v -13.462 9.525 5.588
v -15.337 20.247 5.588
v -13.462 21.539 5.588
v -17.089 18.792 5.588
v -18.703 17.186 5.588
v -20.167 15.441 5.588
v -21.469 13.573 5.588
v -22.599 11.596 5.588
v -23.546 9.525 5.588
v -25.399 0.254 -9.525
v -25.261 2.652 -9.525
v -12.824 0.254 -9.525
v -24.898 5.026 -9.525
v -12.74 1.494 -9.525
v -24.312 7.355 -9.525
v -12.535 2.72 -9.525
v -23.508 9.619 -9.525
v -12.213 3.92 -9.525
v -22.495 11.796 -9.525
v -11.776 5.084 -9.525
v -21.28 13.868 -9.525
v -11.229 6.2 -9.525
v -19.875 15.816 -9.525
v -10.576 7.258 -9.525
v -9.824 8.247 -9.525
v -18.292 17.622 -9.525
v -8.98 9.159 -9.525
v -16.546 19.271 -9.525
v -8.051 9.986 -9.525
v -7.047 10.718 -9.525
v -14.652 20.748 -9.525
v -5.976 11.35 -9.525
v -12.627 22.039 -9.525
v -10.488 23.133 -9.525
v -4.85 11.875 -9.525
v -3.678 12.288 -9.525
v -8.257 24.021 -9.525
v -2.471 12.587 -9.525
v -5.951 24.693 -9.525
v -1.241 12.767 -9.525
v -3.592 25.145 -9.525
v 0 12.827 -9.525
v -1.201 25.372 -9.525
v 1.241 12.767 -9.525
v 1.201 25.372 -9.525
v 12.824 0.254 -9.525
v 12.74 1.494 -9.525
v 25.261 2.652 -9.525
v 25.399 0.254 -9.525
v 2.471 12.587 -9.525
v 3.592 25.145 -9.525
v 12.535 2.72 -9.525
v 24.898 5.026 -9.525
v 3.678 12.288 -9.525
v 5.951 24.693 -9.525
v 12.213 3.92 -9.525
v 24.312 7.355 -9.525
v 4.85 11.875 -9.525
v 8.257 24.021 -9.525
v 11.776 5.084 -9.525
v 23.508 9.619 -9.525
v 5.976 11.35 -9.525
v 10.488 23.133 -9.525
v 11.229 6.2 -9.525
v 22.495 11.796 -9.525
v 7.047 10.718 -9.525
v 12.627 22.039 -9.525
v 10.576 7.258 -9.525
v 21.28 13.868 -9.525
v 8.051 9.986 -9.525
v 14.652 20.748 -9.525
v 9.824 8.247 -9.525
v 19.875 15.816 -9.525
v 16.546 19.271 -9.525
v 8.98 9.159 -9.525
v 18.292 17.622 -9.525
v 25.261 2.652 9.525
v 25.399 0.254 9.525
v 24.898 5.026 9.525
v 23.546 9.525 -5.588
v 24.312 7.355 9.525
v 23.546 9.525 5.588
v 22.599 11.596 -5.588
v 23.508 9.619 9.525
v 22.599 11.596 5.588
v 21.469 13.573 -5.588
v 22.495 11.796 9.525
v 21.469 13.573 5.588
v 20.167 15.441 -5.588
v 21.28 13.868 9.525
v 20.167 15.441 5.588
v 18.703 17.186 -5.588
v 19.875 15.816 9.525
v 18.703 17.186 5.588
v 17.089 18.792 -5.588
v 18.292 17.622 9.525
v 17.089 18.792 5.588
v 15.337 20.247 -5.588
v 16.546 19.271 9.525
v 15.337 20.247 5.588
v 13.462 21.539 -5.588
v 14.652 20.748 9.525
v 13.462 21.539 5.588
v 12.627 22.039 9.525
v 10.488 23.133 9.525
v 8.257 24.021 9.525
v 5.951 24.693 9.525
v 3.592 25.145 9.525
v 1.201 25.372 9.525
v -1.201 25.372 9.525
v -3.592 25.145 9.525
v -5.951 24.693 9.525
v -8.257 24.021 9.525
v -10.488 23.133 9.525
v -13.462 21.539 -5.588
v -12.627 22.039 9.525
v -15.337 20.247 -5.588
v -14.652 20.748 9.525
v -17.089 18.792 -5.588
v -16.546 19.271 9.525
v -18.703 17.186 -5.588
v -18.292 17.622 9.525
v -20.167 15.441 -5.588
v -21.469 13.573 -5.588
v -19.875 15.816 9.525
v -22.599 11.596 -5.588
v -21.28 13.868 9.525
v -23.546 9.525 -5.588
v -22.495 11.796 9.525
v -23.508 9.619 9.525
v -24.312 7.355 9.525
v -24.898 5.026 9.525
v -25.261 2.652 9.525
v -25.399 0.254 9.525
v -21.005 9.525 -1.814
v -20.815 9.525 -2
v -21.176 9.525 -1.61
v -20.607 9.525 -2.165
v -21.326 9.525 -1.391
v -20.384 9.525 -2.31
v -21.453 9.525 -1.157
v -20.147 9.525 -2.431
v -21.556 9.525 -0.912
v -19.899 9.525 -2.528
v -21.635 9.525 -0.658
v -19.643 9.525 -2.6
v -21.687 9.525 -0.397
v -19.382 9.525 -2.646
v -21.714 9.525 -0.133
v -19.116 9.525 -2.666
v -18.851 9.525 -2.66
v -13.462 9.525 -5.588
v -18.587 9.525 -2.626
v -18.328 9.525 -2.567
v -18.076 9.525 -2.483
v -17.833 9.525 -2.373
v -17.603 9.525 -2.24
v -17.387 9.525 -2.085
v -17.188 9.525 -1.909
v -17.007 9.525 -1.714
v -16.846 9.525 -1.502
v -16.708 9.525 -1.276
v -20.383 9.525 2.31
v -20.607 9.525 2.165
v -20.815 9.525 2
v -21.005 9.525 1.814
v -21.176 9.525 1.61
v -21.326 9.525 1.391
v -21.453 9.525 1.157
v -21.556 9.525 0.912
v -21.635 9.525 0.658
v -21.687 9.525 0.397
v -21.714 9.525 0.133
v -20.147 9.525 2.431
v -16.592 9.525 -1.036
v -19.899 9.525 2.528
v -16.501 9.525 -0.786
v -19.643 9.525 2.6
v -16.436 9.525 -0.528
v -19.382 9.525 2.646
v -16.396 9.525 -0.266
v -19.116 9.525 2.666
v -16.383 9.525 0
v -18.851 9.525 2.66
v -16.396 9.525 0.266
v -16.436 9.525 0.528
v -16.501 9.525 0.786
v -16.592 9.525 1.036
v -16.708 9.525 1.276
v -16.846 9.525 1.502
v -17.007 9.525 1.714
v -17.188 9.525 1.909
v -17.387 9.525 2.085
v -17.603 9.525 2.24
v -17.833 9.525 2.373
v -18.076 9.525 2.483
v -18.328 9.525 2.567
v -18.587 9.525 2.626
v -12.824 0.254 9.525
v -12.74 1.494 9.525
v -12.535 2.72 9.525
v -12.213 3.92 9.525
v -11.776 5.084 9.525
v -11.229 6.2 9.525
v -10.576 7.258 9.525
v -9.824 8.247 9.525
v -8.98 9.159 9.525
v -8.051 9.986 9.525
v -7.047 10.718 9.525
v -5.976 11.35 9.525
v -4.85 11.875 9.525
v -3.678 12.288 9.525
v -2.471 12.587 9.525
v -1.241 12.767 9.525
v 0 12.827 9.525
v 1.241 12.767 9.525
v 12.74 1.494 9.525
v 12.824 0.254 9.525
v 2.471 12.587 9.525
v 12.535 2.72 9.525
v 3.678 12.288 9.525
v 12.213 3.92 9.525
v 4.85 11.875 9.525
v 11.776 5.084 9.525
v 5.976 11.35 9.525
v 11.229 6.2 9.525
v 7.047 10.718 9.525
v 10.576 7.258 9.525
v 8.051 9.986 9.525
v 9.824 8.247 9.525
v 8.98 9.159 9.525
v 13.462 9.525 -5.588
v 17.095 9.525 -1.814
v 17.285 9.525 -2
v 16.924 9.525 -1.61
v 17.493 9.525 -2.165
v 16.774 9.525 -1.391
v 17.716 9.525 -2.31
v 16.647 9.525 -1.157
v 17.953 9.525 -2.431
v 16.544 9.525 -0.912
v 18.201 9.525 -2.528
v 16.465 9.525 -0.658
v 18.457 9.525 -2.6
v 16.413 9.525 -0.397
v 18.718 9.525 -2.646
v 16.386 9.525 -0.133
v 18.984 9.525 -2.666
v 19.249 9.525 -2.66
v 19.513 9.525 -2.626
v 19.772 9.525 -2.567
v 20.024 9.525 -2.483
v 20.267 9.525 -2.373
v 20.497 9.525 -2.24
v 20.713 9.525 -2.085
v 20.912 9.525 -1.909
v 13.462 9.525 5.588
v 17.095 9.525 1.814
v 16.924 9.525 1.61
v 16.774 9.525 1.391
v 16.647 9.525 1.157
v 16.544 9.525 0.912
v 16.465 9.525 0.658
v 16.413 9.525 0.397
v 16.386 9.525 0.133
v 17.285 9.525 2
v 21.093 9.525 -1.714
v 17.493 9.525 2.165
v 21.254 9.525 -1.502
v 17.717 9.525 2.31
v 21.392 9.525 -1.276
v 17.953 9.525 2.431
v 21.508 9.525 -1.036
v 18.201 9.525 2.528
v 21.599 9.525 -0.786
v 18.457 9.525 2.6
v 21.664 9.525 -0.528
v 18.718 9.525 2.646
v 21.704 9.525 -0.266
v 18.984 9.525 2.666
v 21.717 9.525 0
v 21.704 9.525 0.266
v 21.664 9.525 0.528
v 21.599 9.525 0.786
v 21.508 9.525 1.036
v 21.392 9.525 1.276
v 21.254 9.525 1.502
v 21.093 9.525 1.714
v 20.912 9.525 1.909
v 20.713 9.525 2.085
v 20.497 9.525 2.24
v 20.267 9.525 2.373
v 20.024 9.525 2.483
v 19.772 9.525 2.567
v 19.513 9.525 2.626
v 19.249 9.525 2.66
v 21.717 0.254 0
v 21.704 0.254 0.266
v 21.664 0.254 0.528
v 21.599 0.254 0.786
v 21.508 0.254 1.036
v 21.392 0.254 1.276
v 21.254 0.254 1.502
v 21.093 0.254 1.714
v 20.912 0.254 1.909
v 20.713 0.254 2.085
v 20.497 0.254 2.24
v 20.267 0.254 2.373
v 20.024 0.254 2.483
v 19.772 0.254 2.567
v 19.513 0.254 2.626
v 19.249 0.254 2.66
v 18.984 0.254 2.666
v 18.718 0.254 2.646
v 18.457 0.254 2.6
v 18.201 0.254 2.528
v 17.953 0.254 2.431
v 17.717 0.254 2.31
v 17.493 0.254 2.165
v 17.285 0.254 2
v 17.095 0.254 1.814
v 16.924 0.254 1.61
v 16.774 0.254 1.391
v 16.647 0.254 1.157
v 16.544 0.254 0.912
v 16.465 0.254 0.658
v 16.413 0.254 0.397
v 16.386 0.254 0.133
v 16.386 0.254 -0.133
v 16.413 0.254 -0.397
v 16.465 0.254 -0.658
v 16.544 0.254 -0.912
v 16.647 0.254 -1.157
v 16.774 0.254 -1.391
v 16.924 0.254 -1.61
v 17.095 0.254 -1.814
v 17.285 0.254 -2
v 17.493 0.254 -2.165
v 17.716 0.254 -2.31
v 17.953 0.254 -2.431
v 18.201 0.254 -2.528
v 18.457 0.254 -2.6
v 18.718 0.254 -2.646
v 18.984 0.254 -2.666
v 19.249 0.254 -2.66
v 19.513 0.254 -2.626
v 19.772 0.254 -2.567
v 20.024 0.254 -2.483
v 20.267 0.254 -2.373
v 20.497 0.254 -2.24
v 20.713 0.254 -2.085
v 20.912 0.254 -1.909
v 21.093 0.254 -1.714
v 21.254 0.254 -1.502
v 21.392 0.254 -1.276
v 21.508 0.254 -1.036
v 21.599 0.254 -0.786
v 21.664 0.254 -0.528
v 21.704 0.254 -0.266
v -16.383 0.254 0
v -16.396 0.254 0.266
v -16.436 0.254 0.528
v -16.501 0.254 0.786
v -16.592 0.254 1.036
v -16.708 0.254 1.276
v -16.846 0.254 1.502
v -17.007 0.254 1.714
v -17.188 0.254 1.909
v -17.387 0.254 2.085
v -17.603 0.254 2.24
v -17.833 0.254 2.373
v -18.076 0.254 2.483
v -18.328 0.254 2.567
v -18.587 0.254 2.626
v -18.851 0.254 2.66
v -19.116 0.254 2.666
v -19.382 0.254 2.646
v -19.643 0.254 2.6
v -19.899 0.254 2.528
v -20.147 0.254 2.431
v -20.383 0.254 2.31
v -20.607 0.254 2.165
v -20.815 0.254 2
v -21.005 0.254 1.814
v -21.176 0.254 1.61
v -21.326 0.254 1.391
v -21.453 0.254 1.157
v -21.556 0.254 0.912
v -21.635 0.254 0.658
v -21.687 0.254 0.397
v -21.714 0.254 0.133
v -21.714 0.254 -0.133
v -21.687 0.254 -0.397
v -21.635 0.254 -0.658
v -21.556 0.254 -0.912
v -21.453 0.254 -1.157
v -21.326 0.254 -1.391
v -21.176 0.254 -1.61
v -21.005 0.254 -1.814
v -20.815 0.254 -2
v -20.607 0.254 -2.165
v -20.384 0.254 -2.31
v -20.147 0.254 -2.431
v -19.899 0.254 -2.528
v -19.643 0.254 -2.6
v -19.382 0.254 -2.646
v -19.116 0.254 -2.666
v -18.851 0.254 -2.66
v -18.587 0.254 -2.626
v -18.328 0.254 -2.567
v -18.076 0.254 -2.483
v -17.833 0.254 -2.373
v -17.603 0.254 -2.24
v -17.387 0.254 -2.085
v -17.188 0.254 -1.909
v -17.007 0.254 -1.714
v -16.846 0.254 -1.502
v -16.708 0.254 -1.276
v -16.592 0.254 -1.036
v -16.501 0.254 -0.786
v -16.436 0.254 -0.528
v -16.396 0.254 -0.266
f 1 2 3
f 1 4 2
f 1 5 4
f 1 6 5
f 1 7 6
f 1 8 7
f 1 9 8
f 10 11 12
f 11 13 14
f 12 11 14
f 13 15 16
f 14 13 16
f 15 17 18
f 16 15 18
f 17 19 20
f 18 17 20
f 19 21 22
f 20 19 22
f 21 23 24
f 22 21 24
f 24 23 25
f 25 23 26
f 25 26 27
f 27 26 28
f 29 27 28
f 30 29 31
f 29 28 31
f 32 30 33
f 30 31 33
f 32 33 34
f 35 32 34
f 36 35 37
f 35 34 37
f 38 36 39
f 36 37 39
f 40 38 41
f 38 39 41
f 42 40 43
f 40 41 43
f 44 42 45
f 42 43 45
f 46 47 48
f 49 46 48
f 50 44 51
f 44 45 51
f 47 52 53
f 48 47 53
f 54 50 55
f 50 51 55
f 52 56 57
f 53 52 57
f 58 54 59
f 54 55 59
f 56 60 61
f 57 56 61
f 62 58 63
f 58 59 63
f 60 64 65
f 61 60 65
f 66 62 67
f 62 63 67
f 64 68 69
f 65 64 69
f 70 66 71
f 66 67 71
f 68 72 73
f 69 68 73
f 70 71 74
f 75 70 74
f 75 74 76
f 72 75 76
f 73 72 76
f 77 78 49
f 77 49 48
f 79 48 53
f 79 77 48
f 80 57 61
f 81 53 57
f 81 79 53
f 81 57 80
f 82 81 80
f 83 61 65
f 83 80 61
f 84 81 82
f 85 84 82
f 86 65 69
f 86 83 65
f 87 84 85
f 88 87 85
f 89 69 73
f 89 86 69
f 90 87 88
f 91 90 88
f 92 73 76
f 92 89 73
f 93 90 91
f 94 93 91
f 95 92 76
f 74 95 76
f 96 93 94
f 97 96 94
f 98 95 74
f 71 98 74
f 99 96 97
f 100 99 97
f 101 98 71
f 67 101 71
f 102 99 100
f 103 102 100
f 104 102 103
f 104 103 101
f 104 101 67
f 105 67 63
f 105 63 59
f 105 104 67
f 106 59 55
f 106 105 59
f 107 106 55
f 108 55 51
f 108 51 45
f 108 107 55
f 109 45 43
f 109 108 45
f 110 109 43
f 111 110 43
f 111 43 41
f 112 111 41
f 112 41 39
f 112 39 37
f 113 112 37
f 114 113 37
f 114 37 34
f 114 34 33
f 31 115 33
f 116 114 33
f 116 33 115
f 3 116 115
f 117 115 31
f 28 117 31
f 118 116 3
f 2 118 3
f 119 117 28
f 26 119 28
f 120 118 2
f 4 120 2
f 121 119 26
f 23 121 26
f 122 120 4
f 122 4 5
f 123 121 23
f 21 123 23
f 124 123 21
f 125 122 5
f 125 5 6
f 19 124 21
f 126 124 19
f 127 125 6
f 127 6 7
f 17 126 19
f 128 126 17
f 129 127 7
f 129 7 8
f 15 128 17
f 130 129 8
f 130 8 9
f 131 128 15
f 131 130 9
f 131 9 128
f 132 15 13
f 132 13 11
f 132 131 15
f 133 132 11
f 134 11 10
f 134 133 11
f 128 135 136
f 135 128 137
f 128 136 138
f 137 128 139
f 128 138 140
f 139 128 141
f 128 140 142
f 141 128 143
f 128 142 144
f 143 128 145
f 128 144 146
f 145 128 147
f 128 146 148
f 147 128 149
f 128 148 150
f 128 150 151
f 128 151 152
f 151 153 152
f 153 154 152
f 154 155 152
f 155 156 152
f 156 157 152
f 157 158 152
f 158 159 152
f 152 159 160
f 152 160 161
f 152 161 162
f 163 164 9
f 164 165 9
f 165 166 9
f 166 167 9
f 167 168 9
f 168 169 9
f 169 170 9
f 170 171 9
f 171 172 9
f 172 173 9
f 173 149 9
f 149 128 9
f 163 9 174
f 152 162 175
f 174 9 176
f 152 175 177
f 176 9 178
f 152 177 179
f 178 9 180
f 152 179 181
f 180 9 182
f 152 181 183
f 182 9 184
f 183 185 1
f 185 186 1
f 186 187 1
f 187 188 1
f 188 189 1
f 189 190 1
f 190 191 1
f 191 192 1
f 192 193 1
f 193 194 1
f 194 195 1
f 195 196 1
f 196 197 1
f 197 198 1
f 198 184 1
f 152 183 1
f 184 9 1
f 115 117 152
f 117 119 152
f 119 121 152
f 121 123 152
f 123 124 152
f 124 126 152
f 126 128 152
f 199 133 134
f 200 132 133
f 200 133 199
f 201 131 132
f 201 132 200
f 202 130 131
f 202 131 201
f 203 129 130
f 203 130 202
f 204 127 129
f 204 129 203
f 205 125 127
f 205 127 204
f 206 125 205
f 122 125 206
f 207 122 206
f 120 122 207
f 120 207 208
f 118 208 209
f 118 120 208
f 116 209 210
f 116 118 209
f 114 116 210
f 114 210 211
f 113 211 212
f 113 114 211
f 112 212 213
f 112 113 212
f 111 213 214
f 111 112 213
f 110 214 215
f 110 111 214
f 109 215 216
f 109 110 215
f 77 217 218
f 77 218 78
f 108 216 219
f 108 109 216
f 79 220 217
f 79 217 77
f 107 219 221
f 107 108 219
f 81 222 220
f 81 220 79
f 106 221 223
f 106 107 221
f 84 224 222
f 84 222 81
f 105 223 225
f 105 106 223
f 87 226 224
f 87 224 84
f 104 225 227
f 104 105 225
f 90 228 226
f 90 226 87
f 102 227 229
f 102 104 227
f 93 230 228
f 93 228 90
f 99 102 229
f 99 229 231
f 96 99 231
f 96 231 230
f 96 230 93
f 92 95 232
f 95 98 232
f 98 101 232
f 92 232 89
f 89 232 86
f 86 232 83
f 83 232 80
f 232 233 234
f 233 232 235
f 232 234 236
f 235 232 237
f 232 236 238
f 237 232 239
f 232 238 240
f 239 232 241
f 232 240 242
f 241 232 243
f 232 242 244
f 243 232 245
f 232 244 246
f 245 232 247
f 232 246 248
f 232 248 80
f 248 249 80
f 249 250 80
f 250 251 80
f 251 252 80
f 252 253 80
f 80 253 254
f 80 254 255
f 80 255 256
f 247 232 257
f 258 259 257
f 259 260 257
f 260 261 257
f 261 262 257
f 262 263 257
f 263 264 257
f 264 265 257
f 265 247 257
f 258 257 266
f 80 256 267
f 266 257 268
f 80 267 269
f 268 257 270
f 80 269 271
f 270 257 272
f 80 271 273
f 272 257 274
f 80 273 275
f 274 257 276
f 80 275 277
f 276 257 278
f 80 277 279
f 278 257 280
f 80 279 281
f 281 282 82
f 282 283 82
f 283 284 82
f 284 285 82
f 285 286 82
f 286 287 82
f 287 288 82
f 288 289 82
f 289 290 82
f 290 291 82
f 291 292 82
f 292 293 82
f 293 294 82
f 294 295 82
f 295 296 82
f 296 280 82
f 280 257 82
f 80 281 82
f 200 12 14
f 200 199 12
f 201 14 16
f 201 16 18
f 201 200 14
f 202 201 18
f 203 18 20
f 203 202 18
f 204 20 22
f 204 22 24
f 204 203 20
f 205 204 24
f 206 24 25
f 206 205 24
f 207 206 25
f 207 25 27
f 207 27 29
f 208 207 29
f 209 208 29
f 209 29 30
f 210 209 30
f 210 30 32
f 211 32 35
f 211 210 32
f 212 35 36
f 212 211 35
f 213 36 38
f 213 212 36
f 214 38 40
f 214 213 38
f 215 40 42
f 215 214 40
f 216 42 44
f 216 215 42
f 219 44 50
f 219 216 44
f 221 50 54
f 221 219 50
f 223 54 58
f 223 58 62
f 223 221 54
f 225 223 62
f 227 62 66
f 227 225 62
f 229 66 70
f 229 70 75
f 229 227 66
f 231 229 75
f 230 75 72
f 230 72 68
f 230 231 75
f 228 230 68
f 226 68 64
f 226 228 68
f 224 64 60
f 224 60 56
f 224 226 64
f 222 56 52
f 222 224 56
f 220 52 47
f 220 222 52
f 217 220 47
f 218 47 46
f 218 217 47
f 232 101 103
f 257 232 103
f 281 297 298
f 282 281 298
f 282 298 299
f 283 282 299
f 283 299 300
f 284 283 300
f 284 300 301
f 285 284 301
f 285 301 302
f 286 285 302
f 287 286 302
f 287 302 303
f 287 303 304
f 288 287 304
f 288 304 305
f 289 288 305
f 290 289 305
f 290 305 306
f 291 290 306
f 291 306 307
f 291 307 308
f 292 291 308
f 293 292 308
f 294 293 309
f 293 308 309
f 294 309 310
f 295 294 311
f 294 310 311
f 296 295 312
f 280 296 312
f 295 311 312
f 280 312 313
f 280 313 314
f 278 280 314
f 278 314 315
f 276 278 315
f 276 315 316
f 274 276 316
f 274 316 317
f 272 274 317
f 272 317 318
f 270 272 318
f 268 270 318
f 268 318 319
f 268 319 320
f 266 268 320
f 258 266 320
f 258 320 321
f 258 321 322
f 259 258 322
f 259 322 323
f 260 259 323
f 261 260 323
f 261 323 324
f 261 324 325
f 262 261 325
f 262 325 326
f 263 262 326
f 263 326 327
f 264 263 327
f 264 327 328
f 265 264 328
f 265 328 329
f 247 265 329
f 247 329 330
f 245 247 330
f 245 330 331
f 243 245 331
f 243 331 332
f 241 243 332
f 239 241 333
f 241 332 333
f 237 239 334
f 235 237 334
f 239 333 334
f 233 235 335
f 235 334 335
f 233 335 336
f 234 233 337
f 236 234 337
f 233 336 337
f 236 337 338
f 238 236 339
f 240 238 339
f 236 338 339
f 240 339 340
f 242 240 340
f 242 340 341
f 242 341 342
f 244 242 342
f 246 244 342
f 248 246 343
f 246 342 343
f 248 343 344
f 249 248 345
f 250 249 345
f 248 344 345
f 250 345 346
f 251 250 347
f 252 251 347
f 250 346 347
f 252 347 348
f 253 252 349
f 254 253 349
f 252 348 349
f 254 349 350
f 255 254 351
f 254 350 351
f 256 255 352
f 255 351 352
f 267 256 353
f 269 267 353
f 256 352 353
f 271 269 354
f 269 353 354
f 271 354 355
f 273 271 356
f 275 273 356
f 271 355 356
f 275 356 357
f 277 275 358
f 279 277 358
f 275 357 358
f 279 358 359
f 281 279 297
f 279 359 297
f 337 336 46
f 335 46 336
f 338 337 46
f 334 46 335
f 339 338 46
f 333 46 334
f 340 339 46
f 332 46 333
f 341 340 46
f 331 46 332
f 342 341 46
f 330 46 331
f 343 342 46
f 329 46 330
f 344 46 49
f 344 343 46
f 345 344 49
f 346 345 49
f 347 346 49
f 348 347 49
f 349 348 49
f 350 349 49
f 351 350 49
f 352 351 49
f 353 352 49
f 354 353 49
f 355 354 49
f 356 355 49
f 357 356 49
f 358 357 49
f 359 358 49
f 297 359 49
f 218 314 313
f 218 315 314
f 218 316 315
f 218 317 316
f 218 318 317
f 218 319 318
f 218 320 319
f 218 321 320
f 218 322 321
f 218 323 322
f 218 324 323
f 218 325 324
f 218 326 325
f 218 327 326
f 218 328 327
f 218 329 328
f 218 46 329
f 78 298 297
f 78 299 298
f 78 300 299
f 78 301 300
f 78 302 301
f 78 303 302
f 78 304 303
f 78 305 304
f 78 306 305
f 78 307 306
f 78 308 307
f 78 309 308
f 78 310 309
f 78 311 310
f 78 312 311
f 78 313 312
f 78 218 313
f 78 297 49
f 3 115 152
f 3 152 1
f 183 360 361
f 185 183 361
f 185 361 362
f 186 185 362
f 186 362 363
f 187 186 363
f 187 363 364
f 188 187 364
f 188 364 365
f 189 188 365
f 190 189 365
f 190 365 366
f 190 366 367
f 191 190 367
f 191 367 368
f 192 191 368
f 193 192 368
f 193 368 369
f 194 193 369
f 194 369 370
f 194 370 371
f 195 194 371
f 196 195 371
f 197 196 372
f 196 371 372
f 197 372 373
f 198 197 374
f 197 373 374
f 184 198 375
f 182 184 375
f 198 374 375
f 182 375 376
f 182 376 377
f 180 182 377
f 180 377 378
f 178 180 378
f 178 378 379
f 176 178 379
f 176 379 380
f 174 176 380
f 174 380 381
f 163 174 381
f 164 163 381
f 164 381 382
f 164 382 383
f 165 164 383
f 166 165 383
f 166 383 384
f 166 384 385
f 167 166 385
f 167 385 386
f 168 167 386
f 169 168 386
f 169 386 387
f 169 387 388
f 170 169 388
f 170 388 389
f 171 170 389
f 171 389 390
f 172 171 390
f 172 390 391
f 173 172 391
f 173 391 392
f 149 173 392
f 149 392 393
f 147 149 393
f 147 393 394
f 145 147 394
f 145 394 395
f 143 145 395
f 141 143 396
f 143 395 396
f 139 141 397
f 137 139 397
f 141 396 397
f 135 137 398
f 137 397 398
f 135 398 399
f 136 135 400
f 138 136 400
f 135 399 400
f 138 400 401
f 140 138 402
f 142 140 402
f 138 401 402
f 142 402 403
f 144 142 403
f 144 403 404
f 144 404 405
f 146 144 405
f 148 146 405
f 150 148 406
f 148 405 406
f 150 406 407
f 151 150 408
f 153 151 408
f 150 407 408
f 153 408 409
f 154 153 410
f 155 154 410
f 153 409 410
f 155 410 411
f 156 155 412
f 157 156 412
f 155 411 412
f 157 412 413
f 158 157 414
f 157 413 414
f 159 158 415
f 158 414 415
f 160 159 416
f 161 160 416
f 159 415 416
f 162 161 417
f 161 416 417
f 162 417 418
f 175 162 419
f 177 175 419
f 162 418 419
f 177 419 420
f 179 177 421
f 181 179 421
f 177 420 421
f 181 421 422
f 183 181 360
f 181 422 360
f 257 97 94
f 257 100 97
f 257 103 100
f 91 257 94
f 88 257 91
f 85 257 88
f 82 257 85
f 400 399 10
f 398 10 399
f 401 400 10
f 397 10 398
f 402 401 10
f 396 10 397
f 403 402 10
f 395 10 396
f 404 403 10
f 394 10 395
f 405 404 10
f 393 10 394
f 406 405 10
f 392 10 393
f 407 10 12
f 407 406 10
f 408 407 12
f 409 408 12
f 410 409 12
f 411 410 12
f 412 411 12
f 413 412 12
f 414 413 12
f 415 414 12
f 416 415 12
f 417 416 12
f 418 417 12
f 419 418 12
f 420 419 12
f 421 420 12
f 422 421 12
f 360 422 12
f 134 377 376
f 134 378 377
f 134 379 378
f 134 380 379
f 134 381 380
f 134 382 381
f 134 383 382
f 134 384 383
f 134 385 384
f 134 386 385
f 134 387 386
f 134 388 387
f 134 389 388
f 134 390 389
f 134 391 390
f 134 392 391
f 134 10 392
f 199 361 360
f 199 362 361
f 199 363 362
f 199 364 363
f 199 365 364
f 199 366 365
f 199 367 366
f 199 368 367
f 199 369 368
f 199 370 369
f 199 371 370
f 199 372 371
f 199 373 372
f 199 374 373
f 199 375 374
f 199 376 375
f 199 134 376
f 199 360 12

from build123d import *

# Parameters (mm, degrees)
F1_DEPTH = 9.525
F2_R     = 2.667
F4_DEPTH = 25.401
F5_W     = 11.93673
F5_H     = 11.176
F6_DEPTH = 15.876


with BuildPart() as f1:
    # F0 (on Top) → F1 (new body, symmetric)
    with BuildSketch(Plane.XY):
        with BuildLine():
            ThreePointArc((-12.824485, 0.254), (0, 12.827), (12.824485, 0.254))
            Line((12.824485, 0.254), (25.39873, 0.254))
            ThreePointArc((25.39873, 0.254), (0, 25.4), (-25.39873, 0.254))
            Line((-25.39873, 0.254), (-12.824485, 0.254))
        make_face()
    extrude(amount=F1_DEPTH, both=True)

    # F2 (on Front) → F4 (cut, through all)
    with BuildSketch(Plane.XZ):
        with Locations((-19.05, 0)):
            Circle(F2_R)
        with Locations((19.05, 0)):
            Circle(F2_R)
    extrude(amount=-F4_DEPTH, mode=Mode.SUBTRACT)

    # F5 (on offset) → F6 (cut, through all)
    with BuildSketch(Plane.XZ.offset(-9.525)):
        with Locations((19.430365, 0)):
            Rectangle(F5_W, F5_H)
        with Locations((-19.430365, 0)):
            Rectangle(F5_W, F5_H)
    extrude(amount=-F6_DEPTH, mode=Mode.SUBTRACT)


solid = f1.part
